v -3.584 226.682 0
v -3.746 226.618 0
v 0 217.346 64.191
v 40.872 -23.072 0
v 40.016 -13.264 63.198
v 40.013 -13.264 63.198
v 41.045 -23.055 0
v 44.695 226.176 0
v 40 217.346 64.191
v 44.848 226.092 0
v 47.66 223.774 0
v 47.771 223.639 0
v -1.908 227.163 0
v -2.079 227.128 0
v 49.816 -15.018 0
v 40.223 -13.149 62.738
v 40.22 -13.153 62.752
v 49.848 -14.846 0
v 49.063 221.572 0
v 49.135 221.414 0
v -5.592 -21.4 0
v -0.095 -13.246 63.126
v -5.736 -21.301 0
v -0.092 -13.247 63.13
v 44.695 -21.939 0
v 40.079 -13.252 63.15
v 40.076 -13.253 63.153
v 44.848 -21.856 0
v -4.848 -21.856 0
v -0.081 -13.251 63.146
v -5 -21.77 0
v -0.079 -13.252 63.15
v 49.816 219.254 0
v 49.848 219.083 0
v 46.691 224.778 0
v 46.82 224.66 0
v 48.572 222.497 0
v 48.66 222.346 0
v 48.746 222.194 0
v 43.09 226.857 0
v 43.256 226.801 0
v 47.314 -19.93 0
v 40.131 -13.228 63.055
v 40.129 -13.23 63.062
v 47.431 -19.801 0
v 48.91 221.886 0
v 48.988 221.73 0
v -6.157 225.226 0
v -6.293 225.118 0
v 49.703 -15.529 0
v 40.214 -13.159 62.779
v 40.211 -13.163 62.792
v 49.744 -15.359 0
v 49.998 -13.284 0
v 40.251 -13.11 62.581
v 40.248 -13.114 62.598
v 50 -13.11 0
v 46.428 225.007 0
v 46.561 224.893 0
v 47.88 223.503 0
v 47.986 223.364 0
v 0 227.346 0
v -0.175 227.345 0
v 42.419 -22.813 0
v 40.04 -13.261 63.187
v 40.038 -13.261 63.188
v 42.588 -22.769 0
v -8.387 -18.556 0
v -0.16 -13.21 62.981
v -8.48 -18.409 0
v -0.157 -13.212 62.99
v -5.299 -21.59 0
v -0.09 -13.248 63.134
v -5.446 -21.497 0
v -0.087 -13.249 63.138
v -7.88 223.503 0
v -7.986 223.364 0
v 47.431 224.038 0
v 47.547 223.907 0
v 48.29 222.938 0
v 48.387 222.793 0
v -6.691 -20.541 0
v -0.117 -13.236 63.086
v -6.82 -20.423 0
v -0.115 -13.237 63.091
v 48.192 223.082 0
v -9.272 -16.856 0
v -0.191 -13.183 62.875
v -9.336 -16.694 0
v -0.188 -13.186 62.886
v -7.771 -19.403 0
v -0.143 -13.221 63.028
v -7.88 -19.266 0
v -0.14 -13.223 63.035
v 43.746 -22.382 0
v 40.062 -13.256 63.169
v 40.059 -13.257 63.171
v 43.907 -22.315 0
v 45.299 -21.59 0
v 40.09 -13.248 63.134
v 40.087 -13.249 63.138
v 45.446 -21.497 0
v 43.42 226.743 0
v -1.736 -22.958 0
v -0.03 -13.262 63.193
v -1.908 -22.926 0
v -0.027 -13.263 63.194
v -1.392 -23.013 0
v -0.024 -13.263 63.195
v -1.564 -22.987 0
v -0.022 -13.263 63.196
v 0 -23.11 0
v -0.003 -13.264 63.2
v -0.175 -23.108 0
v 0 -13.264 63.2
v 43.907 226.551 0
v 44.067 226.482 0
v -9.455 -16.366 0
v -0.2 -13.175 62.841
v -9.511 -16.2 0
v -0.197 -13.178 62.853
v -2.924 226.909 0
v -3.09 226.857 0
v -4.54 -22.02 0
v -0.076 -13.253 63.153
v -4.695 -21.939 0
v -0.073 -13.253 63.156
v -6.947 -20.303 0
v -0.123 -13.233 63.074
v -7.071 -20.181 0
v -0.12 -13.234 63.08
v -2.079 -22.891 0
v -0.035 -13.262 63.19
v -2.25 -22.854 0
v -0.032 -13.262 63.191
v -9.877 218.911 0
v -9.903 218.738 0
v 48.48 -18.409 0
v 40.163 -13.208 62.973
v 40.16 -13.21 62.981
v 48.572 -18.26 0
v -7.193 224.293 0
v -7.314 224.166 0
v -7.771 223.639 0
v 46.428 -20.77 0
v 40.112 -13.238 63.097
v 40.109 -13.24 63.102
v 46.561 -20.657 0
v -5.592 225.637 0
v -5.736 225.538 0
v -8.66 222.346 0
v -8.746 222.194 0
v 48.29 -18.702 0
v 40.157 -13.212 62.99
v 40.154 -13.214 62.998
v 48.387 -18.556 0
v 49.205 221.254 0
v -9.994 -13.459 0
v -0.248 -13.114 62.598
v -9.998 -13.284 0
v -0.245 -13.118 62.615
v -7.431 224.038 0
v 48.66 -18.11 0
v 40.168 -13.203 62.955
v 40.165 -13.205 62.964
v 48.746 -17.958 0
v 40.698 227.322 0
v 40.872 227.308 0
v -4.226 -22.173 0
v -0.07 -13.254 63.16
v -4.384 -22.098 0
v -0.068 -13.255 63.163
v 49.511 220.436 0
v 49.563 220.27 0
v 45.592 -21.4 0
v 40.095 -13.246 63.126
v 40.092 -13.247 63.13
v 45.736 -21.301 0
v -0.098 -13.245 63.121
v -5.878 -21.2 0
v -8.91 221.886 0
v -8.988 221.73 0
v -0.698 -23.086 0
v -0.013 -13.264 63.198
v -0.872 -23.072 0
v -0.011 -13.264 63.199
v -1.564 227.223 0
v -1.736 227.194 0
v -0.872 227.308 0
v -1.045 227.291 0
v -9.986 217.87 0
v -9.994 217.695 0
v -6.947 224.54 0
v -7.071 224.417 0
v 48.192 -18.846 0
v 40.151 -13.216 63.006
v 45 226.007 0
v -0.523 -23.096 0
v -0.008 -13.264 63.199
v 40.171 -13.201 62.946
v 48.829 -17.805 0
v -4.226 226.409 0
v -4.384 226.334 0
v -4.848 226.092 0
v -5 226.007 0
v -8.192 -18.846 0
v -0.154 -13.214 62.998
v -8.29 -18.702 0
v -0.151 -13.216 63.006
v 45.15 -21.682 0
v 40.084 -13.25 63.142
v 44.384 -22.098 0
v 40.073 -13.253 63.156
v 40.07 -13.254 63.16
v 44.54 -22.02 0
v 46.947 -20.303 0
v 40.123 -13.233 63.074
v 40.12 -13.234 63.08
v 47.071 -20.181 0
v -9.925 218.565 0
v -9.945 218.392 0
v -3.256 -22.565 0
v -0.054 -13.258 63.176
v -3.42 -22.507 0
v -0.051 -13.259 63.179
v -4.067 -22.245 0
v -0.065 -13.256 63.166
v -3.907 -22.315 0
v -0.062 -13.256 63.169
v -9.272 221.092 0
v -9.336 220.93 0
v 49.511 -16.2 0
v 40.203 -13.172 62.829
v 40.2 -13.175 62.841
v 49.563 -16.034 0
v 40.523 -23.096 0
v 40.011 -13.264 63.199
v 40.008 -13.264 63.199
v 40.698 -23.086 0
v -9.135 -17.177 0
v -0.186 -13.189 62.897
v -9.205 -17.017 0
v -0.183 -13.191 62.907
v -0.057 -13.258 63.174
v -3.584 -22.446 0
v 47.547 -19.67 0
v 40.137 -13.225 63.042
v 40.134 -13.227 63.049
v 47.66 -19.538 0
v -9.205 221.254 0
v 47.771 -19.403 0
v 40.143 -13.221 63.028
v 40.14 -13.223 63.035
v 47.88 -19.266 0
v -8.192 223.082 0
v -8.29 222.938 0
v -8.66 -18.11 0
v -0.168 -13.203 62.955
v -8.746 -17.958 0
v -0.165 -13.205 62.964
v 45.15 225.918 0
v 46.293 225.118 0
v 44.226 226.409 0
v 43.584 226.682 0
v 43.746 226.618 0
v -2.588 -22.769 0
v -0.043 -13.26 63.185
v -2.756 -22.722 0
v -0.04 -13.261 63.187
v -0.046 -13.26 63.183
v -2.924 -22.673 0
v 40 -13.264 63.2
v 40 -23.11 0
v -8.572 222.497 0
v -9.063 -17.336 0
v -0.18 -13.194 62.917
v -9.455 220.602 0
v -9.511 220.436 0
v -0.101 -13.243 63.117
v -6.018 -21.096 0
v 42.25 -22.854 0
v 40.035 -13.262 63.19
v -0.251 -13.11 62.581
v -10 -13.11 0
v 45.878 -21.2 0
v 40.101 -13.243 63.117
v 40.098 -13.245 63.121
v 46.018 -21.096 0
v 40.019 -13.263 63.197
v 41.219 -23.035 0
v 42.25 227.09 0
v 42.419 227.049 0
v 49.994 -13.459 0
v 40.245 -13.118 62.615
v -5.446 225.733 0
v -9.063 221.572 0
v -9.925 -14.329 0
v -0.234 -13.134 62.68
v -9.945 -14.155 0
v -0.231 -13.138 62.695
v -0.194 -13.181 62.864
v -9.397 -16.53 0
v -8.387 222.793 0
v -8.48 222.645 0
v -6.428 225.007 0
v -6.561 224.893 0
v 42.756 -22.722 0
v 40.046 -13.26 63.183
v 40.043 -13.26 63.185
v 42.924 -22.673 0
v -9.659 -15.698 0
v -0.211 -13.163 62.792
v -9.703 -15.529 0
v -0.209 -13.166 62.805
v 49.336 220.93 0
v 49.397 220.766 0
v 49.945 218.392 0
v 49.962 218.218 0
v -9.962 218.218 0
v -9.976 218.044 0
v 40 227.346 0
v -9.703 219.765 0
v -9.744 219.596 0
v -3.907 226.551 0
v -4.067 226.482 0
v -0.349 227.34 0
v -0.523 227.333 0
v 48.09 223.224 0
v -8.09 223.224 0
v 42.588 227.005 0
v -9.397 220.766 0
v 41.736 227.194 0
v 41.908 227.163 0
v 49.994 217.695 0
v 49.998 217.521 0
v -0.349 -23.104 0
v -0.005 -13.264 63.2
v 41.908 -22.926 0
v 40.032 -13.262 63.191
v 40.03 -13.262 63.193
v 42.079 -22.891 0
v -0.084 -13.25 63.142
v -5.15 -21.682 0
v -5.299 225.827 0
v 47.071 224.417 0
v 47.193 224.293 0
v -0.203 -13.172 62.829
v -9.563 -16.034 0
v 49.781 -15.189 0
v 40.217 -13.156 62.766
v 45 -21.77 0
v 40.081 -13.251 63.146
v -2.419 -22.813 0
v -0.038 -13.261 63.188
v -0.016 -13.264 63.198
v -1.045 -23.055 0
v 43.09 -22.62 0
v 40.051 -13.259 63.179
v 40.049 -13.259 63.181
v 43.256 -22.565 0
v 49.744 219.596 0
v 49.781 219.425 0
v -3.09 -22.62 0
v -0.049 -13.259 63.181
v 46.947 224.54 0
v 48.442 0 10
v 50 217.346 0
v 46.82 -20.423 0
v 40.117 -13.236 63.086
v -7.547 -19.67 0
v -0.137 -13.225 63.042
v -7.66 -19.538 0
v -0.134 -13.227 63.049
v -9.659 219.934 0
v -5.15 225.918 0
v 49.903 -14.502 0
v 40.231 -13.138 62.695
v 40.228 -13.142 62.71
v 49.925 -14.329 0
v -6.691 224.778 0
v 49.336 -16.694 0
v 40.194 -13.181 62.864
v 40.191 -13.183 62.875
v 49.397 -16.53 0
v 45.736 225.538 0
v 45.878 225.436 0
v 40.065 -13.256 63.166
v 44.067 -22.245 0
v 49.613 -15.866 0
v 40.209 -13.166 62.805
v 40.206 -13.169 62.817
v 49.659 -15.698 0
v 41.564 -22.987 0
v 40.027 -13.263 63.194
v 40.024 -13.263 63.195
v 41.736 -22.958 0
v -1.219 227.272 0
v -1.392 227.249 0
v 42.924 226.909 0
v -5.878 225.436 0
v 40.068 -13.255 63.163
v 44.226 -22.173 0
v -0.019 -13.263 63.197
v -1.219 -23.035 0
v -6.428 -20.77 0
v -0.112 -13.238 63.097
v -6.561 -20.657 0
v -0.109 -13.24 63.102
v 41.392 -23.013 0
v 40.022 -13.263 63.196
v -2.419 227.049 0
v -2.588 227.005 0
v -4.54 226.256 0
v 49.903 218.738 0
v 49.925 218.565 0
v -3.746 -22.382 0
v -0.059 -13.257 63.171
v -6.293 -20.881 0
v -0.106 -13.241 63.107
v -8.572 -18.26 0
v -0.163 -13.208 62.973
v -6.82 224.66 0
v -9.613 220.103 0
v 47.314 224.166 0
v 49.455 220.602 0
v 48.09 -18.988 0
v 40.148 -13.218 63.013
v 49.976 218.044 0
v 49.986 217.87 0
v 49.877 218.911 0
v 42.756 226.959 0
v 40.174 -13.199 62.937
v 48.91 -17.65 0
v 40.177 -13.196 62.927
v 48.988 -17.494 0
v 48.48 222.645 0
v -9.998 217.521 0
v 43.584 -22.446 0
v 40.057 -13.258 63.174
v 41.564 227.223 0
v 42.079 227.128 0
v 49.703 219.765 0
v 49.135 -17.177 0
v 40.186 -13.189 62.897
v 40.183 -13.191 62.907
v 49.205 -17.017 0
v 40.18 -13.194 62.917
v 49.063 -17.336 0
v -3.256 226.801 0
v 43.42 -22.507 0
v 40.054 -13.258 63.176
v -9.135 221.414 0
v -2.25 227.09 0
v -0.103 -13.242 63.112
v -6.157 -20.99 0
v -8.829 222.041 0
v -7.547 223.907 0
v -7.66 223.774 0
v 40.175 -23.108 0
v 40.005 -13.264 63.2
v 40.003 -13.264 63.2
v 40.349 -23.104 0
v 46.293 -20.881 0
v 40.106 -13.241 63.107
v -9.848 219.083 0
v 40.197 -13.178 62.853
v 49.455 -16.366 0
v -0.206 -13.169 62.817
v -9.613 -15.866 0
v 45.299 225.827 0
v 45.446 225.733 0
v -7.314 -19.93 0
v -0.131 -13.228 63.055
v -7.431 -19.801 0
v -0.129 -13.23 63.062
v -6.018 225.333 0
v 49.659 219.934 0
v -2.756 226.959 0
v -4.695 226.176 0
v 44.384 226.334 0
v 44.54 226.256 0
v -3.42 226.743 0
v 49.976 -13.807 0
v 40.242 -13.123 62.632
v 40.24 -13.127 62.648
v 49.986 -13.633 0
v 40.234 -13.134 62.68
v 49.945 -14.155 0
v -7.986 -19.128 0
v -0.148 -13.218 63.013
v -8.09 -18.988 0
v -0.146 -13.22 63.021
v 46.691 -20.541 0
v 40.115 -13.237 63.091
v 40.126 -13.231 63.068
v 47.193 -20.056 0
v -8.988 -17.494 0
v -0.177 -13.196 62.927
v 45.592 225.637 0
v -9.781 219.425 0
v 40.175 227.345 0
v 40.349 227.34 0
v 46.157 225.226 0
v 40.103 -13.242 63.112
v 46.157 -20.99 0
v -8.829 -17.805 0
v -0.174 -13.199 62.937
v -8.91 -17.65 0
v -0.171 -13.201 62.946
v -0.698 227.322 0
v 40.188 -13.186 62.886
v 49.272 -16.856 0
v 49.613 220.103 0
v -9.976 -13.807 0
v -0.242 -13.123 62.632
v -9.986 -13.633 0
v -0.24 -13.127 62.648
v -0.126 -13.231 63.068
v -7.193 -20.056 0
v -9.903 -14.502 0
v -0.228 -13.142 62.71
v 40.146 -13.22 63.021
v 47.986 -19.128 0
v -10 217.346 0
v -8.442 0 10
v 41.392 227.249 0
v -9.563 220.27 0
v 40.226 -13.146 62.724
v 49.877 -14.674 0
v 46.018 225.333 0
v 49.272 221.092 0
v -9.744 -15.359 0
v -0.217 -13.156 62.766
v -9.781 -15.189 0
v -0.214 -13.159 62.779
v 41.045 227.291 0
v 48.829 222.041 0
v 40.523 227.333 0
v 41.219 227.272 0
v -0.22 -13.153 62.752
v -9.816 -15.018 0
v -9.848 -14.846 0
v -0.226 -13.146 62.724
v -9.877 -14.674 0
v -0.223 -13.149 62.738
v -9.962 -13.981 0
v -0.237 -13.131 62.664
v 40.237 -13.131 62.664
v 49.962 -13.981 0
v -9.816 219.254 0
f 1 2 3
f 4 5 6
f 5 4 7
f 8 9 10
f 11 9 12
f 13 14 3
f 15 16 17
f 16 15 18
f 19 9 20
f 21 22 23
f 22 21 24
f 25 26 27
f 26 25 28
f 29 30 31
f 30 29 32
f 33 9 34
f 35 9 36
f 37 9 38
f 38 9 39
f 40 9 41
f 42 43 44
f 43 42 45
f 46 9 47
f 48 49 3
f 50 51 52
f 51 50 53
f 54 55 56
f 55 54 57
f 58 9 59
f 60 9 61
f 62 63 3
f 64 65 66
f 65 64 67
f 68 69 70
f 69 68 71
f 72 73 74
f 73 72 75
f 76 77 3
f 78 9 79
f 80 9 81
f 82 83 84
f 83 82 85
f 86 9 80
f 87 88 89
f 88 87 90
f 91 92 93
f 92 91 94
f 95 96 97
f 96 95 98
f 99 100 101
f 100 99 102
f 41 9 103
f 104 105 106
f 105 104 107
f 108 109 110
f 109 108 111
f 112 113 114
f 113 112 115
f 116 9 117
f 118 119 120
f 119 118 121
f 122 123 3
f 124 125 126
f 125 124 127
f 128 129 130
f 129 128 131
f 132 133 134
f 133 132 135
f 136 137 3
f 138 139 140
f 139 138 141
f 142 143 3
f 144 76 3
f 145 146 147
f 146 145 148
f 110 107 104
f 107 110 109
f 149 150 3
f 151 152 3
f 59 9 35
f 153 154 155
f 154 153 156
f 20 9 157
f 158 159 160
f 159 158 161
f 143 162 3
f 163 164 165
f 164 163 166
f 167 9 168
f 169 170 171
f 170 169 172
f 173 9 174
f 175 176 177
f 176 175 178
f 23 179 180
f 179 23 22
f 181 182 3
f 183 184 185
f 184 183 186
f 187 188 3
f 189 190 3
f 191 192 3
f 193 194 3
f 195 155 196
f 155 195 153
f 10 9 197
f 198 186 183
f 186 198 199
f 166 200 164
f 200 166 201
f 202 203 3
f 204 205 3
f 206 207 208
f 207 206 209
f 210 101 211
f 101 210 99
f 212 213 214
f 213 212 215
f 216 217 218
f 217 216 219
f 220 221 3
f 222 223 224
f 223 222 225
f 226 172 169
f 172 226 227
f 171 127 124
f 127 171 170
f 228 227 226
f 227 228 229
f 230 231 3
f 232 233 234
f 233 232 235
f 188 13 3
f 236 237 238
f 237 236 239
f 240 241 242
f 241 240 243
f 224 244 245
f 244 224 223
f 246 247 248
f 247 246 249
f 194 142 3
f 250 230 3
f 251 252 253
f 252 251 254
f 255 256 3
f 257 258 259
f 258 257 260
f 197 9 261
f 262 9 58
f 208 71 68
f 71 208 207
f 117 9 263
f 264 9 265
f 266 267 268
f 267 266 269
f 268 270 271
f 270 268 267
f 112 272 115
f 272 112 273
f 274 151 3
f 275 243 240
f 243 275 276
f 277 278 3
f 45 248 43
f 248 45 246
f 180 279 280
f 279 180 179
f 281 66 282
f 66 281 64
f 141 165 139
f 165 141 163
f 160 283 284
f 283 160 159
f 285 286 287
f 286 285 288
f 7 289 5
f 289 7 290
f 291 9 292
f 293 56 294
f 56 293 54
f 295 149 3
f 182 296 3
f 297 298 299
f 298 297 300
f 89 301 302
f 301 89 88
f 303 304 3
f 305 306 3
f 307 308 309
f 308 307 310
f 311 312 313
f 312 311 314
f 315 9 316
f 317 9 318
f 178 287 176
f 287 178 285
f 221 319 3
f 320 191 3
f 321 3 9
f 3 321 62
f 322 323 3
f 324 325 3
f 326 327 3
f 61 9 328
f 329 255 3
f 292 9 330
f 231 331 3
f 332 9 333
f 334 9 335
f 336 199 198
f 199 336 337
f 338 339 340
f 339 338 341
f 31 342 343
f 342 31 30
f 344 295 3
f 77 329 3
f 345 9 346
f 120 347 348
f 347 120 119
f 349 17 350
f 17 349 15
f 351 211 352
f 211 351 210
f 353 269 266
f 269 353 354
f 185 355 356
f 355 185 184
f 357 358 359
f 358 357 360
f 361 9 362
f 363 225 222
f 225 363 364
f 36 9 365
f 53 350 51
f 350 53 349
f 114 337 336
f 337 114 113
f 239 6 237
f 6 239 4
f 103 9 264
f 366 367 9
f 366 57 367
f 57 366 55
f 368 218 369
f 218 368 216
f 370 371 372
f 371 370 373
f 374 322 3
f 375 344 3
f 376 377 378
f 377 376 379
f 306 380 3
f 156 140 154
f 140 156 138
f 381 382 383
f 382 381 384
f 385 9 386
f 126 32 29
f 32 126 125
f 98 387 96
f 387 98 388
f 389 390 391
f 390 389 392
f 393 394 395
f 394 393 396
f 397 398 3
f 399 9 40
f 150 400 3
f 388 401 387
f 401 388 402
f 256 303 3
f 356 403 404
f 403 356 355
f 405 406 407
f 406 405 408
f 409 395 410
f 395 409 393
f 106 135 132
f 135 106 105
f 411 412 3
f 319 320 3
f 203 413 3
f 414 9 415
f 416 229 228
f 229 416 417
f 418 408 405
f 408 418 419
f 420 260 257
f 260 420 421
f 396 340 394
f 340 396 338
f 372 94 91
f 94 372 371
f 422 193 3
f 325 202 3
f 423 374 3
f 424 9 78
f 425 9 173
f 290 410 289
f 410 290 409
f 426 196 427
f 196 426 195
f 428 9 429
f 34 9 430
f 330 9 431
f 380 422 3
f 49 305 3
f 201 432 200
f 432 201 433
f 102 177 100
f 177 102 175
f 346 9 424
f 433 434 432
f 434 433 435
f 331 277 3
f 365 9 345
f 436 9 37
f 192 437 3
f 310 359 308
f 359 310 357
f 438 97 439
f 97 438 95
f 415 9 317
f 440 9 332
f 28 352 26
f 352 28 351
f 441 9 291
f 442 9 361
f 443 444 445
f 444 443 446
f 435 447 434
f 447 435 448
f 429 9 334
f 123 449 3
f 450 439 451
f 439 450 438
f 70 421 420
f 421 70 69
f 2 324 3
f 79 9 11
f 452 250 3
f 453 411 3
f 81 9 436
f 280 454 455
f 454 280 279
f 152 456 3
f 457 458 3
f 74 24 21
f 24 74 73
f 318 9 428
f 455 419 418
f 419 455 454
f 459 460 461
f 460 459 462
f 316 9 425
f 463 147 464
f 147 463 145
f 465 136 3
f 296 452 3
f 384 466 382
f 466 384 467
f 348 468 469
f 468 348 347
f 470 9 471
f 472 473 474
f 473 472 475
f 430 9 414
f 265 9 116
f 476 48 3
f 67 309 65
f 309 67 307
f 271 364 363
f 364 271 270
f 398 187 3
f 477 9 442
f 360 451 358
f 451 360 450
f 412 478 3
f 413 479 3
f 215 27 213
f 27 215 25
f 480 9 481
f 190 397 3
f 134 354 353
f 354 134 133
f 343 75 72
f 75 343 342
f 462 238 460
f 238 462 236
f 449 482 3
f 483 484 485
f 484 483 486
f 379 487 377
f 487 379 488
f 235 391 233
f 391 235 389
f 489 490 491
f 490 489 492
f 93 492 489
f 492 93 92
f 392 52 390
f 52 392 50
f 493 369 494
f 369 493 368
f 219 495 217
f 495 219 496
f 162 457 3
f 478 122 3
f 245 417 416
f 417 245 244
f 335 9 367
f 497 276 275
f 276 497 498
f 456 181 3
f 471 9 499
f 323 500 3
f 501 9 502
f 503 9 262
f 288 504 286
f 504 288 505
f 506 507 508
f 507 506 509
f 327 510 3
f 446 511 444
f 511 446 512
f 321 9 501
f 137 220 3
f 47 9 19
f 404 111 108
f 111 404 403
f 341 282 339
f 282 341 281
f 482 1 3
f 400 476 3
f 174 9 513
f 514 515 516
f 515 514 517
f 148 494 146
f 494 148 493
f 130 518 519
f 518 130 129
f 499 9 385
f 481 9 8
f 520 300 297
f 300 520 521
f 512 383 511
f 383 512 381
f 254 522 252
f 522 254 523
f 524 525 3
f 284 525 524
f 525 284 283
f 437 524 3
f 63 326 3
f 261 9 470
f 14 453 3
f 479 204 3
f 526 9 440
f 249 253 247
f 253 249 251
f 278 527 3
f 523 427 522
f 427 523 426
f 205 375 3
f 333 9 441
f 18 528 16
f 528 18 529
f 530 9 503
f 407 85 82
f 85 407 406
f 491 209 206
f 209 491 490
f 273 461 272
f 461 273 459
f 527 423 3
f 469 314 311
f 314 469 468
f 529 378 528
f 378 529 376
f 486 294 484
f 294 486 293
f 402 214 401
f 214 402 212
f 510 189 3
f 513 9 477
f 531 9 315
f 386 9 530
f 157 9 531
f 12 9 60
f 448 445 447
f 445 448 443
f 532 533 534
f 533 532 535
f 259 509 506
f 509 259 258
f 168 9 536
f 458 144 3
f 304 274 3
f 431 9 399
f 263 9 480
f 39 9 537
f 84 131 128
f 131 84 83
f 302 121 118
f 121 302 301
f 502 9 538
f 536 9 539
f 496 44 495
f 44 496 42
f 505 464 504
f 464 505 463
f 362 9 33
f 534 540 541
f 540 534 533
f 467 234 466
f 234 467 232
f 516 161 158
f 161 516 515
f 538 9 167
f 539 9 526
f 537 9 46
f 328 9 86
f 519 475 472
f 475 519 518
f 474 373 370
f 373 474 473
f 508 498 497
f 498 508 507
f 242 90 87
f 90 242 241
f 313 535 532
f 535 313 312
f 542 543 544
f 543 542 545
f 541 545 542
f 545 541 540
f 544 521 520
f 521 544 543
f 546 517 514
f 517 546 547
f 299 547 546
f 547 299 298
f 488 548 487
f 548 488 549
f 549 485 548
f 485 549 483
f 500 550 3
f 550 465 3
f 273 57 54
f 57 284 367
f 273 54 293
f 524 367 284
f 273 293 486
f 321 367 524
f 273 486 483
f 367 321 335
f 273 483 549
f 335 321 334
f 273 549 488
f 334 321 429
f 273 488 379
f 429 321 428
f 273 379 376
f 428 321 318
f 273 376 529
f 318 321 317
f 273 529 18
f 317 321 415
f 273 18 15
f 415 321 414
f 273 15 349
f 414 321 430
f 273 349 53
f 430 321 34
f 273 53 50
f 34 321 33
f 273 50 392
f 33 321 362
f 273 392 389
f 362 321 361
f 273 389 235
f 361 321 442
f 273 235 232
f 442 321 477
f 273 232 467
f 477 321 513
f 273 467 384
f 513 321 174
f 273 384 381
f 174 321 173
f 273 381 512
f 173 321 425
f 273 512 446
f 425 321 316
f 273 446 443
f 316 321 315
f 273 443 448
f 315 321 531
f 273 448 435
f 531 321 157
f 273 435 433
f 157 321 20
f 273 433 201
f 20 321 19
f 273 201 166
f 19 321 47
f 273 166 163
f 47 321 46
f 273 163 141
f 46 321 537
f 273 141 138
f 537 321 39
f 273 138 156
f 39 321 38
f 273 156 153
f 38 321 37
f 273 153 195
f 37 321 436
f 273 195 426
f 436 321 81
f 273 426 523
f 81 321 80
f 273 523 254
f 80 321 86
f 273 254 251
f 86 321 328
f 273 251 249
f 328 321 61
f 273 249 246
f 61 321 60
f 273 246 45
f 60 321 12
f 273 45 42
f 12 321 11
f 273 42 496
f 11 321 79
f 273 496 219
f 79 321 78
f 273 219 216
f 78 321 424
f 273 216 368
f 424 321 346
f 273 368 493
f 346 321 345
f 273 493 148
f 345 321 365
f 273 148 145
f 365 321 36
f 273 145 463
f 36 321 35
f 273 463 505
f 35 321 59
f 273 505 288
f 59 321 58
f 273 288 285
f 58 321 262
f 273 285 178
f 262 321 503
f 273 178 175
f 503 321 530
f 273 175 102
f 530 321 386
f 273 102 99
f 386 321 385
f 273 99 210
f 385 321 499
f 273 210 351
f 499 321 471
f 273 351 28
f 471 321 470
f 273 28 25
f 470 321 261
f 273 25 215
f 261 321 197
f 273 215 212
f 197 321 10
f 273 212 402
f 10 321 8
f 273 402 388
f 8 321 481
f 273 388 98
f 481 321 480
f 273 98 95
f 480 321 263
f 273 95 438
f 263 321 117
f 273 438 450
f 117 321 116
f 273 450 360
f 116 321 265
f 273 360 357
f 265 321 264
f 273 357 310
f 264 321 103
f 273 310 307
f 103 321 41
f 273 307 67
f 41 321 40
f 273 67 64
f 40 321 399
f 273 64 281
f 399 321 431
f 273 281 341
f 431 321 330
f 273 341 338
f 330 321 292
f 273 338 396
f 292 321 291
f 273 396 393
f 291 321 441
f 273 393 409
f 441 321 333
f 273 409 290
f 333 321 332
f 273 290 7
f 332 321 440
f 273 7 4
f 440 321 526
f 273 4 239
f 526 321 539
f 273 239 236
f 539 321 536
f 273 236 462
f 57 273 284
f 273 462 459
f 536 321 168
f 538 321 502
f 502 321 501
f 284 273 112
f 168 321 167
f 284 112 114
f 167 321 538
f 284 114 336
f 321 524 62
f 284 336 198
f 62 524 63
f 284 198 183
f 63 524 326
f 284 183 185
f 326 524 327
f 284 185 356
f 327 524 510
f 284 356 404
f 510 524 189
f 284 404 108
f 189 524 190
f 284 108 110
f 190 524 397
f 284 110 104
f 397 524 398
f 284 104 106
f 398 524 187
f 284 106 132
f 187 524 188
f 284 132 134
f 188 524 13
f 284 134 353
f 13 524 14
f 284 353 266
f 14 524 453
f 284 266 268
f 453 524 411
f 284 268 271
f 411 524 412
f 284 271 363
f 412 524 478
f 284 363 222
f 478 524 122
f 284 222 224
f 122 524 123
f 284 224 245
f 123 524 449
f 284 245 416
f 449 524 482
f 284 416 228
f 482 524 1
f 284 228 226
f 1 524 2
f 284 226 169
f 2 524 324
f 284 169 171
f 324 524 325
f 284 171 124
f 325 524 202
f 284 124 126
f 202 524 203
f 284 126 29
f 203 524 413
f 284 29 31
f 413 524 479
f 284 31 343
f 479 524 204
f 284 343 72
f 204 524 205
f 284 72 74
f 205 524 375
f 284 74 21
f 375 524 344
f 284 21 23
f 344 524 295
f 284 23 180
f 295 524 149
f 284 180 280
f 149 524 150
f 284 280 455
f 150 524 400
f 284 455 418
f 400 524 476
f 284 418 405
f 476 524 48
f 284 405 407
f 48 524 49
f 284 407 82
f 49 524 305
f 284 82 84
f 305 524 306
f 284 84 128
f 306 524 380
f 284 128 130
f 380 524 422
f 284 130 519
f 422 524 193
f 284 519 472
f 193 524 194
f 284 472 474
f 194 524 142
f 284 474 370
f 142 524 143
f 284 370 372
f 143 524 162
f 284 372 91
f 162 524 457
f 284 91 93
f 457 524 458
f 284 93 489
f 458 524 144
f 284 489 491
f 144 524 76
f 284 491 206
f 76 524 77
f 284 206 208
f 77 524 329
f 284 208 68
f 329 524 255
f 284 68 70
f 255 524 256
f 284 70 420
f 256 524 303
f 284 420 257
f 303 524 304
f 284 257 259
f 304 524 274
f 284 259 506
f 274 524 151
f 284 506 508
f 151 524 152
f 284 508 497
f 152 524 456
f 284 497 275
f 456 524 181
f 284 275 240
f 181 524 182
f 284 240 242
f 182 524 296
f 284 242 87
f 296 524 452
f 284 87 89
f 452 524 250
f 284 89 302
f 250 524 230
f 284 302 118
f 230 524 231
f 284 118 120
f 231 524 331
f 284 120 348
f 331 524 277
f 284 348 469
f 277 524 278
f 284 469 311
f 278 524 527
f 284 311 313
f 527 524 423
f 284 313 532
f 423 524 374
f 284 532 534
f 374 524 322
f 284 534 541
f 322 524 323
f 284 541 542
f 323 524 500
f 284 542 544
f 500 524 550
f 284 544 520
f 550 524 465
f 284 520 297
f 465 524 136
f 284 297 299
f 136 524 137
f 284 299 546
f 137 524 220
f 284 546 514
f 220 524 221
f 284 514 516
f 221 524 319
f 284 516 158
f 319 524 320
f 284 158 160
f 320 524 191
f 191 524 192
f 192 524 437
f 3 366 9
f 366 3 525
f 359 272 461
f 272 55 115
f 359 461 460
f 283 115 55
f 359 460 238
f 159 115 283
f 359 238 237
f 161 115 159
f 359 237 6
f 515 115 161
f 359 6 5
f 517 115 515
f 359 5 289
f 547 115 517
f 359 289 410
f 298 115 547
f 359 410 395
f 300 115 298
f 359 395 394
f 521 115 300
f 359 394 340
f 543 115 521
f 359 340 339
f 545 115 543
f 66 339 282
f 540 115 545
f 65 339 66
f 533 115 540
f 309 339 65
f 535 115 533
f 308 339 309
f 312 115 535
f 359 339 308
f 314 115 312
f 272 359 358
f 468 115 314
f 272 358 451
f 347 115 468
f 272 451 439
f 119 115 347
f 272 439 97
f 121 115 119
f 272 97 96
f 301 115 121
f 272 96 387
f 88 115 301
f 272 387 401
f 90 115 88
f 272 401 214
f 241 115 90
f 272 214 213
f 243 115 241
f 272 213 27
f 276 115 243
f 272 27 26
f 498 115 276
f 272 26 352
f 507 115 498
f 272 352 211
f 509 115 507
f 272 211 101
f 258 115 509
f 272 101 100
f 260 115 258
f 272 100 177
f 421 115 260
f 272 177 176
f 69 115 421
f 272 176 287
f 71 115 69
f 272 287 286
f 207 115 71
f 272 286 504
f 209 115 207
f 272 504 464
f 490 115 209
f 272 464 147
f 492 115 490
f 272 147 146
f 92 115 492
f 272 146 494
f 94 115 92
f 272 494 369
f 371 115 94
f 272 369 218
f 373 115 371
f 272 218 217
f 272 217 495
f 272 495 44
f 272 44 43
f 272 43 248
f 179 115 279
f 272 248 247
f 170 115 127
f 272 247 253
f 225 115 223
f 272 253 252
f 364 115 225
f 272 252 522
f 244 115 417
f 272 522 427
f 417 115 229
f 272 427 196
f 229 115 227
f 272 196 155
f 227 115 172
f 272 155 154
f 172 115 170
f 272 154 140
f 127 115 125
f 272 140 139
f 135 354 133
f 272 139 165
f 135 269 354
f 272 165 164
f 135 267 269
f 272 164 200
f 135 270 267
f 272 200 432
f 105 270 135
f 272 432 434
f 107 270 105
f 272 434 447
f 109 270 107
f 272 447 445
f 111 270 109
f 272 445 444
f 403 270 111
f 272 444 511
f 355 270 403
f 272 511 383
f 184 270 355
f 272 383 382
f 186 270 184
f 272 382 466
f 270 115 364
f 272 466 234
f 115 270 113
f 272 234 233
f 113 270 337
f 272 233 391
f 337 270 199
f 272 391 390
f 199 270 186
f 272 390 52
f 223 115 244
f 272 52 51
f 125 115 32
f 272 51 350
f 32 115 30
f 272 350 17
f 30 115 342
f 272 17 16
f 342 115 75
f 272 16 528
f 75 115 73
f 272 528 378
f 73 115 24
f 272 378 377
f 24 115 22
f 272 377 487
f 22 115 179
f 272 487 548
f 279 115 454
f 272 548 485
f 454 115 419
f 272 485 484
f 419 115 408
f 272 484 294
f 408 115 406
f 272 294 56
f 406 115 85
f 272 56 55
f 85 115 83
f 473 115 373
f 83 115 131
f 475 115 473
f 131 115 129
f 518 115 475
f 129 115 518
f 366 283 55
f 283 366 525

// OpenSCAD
incline = 14; //Incline of the speaker in degrees.
length = 224; //Length of the speaker in millimetres.
width = 40; //Width of the footing.
wider_base = 10; //The base can be a bit wider.
thickness_base = 10;

$fa = 1;
$fs = 0.1;
/////////////////

height = sin(incline) * length;

difference() {
	minkowski() {
		translate([0, -sin(incline) * height, 0]) {
			cube([width, sin(incline) * height + cos(incline) * length, height + thickness_base]);
		}
		translate([0, 0, -height - thickness_base]) {
			cylinder(h=height + thickness_base, r1=wider_base, r2=0);
		}
	}
	translate([-wider_base, -wider_base - sin(incline) * height, -height - thickness_base]) {
		cube([width + wider_base * 2, sin(incline) * height + cos(incline) * length + wider_base * 2, height + thickness_base]);
	}
	translate([-wider_base, 0, thickness_base]) {
		rotate([incline, 0, 0]) {
			cube([width + wider_base * 2, length, length]);
		}
	}
}
